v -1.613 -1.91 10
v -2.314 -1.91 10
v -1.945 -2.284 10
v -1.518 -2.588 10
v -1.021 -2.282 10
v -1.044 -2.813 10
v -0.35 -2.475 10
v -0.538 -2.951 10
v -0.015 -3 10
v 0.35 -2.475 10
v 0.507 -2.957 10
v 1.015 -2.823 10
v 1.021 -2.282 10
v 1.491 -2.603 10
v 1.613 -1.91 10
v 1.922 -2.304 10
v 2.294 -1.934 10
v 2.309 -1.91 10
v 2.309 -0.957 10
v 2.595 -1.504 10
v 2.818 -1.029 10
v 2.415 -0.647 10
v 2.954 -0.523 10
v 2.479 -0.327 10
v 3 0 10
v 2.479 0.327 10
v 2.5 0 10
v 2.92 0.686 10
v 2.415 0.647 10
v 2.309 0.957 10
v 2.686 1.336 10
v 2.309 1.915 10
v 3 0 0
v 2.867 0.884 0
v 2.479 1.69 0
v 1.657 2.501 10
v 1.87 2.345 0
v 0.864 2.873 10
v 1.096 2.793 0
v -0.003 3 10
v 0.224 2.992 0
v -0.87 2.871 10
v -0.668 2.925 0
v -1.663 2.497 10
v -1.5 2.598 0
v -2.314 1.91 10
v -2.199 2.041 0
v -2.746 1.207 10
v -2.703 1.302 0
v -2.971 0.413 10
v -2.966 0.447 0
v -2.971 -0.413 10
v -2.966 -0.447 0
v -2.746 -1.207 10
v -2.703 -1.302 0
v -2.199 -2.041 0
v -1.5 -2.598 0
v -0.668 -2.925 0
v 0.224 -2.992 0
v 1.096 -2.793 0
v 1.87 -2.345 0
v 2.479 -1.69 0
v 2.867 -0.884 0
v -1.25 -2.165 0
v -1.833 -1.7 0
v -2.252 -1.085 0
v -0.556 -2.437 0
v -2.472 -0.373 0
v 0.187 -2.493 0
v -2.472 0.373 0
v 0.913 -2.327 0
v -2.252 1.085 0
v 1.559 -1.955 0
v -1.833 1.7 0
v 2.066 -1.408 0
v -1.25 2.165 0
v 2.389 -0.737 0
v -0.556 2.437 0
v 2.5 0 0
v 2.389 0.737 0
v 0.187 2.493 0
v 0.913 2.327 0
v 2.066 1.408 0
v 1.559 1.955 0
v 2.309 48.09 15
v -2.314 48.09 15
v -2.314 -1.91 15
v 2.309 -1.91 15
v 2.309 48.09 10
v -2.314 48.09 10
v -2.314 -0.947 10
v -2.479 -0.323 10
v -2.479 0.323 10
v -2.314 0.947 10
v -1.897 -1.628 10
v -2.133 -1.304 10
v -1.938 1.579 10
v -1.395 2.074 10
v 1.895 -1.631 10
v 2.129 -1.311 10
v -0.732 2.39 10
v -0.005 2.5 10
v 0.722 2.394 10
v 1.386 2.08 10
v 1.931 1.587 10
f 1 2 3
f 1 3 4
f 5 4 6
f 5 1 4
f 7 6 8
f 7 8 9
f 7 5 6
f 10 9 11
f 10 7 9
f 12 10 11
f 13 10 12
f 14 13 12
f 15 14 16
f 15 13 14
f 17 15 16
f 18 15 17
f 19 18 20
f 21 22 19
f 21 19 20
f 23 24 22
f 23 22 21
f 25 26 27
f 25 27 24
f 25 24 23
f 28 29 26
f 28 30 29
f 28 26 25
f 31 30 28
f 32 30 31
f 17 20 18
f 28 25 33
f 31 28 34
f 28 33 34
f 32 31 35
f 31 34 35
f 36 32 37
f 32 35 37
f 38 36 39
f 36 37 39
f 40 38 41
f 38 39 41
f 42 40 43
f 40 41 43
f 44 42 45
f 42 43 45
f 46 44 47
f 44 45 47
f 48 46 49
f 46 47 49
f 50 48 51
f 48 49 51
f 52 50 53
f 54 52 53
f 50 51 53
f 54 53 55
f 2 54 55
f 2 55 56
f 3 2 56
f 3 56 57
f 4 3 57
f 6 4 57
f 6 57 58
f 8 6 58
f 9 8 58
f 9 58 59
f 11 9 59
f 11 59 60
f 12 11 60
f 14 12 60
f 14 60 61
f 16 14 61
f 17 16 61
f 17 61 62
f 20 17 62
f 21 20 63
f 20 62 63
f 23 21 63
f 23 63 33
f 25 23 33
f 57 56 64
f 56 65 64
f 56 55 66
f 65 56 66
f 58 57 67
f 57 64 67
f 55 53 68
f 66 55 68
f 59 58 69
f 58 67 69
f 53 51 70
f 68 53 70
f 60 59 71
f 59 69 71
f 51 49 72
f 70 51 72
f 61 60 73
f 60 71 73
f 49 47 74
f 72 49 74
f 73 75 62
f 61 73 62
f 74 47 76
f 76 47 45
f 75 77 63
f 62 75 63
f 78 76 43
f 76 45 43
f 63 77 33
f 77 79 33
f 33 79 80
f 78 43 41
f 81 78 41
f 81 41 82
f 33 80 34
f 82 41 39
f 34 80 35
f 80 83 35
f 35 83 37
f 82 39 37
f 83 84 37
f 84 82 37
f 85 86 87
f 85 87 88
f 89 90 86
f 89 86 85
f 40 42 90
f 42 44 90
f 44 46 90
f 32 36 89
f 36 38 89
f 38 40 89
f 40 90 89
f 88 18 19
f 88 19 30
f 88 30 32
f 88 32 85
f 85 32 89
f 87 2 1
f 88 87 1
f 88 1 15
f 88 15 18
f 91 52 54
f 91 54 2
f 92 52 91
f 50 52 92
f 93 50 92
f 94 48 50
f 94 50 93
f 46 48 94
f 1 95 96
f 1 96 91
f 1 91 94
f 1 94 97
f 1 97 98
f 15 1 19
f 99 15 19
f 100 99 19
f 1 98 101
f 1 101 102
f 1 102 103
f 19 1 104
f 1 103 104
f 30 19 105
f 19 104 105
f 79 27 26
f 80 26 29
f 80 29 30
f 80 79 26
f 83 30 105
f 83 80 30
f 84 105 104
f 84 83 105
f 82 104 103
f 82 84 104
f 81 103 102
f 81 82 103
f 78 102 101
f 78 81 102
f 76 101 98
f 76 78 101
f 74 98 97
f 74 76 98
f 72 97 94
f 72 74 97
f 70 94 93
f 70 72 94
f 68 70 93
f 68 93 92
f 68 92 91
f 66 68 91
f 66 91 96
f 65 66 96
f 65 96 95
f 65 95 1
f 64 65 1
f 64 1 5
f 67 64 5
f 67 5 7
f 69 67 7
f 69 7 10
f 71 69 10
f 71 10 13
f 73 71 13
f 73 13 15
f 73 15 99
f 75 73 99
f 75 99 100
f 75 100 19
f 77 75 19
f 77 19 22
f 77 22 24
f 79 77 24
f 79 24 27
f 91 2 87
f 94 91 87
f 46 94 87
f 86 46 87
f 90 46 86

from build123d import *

# Parameters (mm, degrees)
CROQUIS1_R              = 3
CROQUIS1_R_2            = 2.5
SALIENTE_EXTRUIR1_DEPTH = 10
CROQUIS2_W              = 4.622971646
CROQUIS2_H              = 50
SALIENTE_EXTRUIR2_DEPTH = 5


with BuildPart() as part:
    # Croquis1 → Saliente-Extruir1 (new body)
    with BuildSketch(Plane.XY):
        Circle(CROQUIS1_R)
        Circle(CROQUIS1_R_2, mode=Mode.SUBTRACT)
    extrude(amount=SALIENTE_EXTRUIR1_DEPTH)

    # Croquis2 → Saliente-Extruir2 (add)
    with BuildSketch(Plane.XY.offset(10)):
        with Locations((-0.002035099, 23.090125411)):
            Rectangle(CROQUIS2_W, CROQUIS2_H)
    extrude(amount=SALIENTE_EXTRUIR2_DEPTH)


solid = part.part
